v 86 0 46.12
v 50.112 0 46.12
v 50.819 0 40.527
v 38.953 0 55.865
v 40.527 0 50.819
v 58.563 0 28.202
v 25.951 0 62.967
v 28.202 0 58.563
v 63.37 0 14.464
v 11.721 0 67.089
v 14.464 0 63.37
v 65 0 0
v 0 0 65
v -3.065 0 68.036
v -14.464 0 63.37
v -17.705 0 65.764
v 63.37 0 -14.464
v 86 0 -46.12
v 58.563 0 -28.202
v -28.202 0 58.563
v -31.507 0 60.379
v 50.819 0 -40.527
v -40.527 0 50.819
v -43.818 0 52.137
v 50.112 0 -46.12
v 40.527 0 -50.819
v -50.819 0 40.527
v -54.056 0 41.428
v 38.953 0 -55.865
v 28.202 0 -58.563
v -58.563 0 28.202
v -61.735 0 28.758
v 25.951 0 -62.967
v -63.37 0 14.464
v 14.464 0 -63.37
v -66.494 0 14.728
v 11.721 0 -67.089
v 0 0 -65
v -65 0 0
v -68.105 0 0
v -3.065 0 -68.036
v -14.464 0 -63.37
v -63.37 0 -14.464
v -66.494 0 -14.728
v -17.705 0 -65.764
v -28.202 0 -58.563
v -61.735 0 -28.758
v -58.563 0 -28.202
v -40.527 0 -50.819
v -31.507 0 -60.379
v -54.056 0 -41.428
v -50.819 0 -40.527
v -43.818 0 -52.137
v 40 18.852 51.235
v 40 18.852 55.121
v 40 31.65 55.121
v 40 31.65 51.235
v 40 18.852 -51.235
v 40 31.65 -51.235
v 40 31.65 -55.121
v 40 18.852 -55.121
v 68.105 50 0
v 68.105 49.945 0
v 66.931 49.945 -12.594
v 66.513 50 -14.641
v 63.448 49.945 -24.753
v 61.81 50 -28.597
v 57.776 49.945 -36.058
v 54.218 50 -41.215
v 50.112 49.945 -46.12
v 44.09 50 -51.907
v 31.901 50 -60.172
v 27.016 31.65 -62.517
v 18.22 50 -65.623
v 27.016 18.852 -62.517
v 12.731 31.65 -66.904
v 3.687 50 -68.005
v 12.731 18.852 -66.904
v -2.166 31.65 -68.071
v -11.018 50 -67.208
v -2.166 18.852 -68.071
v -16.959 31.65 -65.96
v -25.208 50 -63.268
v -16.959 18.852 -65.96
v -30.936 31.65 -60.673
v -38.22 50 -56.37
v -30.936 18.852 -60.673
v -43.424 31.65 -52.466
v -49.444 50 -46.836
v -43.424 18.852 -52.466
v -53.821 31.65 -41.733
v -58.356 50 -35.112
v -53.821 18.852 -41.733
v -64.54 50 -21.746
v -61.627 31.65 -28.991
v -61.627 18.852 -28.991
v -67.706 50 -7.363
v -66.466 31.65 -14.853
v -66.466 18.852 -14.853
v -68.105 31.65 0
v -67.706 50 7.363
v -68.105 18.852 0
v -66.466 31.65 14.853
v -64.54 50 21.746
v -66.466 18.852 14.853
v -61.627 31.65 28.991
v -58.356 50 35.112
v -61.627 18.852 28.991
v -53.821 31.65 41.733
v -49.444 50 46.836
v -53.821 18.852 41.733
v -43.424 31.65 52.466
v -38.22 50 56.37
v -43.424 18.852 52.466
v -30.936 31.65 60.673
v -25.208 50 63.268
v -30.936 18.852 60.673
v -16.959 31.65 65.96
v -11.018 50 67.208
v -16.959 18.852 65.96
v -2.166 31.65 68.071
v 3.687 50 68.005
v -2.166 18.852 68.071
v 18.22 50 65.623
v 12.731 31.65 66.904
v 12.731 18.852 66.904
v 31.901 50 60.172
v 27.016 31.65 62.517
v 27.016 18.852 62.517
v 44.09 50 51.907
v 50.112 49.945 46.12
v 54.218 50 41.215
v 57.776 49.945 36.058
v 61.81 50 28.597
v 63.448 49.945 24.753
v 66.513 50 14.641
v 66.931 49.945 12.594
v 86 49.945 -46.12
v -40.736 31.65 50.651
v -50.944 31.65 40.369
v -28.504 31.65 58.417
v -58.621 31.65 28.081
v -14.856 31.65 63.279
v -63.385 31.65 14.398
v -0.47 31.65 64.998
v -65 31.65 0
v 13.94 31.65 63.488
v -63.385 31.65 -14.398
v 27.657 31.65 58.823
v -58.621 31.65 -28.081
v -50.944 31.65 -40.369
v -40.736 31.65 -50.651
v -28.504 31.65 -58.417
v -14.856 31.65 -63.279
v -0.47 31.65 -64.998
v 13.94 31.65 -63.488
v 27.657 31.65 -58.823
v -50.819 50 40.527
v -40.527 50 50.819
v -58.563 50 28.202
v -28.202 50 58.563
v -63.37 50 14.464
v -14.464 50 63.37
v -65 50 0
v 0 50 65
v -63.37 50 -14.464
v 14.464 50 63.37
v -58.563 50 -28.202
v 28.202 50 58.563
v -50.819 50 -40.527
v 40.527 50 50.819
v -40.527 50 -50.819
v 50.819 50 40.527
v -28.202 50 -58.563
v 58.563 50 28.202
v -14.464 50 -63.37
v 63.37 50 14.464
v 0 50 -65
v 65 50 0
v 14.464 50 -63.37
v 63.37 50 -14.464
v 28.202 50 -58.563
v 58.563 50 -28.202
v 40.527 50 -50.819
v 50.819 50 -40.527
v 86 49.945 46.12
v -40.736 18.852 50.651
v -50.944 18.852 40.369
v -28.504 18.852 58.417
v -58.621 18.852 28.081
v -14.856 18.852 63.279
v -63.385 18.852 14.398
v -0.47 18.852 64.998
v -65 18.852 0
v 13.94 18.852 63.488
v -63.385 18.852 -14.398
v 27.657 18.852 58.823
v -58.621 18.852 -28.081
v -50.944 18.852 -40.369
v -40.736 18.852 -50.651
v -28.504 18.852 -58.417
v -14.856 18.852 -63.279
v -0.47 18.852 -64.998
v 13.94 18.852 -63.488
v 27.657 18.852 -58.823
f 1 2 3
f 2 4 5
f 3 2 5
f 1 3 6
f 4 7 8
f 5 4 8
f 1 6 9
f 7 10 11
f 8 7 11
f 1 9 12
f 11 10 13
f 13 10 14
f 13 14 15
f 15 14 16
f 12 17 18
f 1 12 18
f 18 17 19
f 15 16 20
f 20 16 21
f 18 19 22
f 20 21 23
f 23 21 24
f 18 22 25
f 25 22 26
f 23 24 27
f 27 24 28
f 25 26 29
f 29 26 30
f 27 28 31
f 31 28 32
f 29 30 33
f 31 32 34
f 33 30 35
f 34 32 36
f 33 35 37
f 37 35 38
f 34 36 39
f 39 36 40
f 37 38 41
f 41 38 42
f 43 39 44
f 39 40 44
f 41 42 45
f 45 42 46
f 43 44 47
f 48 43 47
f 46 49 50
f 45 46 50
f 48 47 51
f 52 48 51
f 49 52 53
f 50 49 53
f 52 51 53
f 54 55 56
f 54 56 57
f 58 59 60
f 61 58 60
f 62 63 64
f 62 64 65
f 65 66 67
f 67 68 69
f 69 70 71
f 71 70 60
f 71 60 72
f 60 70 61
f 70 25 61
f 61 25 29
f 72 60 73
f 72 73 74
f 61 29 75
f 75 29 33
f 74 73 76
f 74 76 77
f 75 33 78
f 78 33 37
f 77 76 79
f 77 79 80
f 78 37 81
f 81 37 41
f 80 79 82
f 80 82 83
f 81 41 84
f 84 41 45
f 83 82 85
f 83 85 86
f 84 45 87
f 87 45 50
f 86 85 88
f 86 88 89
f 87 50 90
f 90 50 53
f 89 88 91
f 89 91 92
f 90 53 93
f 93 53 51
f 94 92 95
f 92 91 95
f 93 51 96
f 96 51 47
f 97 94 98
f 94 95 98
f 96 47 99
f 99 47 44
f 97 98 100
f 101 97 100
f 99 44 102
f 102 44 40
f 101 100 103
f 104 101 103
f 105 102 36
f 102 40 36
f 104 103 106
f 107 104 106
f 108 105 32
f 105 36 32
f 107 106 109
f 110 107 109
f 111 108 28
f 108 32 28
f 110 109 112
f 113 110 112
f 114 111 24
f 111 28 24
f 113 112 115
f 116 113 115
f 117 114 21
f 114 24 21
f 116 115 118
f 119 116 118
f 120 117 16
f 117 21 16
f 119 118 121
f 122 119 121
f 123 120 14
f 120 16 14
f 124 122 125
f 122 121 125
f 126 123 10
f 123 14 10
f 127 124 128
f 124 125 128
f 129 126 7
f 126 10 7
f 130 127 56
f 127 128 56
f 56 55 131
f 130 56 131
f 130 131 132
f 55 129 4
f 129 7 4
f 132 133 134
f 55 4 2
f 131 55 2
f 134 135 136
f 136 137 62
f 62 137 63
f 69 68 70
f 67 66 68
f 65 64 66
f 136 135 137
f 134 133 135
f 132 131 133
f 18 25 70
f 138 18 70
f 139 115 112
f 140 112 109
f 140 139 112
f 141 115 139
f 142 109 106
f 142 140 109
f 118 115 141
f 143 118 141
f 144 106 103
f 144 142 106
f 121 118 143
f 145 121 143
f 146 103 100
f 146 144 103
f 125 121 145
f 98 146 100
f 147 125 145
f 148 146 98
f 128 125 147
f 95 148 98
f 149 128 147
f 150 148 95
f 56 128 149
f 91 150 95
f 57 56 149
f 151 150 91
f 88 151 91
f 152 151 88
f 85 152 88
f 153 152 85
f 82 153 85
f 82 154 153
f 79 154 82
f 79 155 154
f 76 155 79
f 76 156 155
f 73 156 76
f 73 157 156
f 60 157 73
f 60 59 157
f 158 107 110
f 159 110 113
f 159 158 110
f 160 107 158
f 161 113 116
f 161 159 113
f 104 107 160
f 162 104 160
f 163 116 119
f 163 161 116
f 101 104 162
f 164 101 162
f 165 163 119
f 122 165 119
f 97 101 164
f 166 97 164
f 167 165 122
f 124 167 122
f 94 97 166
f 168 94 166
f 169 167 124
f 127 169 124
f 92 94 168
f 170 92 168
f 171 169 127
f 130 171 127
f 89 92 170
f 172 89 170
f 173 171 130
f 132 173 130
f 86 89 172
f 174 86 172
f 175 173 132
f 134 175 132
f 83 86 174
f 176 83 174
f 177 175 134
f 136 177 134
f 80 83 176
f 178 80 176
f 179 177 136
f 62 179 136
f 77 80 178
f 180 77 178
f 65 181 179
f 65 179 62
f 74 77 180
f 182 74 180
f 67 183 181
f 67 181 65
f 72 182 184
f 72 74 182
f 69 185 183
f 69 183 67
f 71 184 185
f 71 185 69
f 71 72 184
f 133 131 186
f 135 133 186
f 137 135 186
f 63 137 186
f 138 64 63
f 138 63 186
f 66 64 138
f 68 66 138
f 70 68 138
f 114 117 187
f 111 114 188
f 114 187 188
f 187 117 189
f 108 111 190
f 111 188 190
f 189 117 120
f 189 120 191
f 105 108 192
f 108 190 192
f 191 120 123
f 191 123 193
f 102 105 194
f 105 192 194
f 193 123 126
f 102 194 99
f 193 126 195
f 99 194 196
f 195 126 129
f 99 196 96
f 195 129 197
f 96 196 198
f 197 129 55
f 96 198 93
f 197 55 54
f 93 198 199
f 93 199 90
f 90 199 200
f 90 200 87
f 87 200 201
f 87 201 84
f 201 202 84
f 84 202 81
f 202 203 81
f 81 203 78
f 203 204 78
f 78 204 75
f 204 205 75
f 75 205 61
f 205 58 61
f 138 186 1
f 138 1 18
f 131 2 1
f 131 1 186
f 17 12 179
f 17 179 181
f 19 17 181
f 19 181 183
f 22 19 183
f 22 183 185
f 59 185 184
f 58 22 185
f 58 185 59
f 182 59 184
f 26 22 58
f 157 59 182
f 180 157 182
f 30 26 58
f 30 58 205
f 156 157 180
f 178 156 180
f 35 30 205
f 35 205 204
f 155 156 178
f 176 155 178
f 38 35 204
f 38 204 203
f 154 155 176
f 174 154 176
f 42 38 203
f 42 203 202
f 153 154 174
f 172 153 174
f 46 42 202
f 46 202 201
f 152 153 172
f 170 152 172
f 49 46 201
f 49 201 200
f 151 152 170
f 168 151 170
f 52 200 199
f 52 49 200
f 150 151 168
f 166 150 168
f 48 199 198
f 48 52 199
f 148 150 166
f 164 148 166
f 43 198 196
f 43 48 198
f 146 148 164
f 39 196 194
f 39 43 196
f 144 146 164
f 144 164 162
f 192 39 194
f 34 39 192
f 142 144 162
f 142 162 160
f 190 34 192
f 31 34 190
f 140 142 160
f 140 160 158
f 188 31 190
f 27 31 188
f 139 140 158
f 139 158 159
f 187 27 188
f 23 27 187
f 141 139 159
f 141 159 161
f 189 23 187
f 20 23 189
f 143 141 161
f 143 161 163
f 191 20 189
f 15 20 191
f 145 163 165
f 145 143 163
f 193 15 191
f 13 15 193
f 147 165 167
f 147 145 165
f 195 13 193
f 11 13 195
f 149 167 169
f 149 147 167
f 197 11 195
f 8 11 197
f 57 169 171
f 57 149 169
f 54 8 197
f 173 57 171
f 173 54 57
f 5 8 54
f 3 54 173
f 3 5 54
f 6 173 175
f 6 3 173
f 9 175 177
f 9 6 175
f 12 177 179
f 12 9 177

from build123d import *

# Parameters (mm, degrees)
CROQUIS1_R              = 68.105038976
CROQUIS1_R_2            = 65
SALIENTE_EXTRUIR1_DEPTH = 50
CROQUIS2_W              = 92.239777398
CROQUIS2_H              = 49.94465134
SALIENTE_EXTRUIR2_DEPTH = 86
CROQUIS3_R              = 65
CORTAR_EXTRUIR1_DEPTH   = 86
CROQUIS4_W              = 159.378049442
CROQUIS4_H              = 12.797364704
CORTAR_EXTRUIR2_DEPTH   = 144


with BuildPart() as part:
    # Croquis1 → Saliente-Extruir1 (new body)
    with BuildSketch(Plane(origin=(0, 0, 0), x_dir=(1, 0, 0), z_dir=(0, 1, 0))):
        Circle(CROQUIS1_R)
        Circle(CROQUIS1_R_2, mode=Mode.SUBTRACT)
    extrude(amount=SALIENTE_EXTRUIR1_DEPTH)

    # Croquis2 → Saliente-Extruir2 (add)
    with BuildSketch(Plane(origin=(0, 0, 0), x_dir=(0, 0, -1), z_dir=(1, 0, 0))):
        with Locations((0, 24.97232567)):
            Rectangle(CROQUIS2_W, CROQUIS2_H)
    extrude(amount=SALIENTE_EXTRUIR2_DEPTH)

    # Croquis3 → Cortar-Extruir1 (cut)
    with BuildSketch(Plane(origin=(0, 50, 0), x_dir=(1, 0, 0), z_dir=(0, 1, 0))):
        Circle(CROQUIS3_R)
    extrude(amount=-CORTAR_EXTRUIR1_DEPTH, mode=Mode.SUBTRACT)

    # Croquis4 → Cortar-Extruir2 (cut)
    with BuildSketch(Plane(origin=(40, 0, 0), x_dir=(0, 0, -1), z_dir=(1, 0, 0))):
        with Locations((-2.615595337, 25.25092872)):
            Rectangle(CROQUIS4_W, CROQUIS4_H)
    extrude(amount=-CORTAR_EXTRUIR2_DEPTH, mode=Mode.SUBTRACT)


solid = part.part
